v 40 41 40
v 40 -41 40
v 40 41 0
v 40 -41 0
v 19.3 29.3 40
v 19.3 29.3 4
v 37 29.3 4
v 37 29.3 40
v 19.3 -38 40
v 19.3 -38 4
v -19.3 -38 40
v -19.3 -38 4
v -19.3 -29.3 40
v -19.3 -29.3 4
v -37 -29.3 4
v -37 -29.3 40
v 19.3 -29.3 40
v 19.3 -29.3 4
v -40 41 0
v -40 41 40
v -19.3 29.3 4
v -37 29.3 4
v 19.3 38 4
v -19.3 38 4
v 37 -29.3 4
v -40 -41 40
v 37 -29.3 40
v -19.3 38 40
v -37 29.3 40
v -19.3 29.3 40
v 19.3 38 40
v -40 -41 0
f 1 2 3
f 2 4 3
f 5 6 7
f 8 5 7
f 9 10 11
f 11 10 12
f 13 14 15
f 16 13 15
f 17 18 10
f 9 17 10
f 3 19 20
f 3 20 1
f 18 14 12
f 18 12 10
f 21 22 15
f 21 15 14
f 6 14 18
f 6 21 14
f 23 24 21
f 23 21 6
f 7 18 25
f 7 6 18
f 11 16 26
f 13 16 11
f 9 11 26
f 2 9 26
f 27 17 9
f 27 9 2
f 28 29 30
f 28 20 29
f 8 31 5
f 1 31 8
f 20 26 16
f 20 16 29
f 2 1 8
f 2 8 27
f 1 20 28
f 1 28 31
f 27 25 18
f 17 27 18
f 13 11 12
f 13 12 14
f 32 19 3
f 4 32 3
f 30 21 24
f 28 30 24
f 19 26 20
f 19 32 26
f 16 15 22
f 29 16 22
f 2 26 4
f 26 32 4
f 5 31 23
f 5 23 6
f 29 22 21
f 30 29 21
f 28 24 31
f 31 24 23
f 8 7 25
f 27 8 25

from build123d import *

# Parameters (mm, degrees)
F0_W     = 80
F0_H     = 82
F1_DEPTH = 4
F2_W     = 80
F2_H     = 82
F3_DEPTH = 36


with BuildPart() as f1:
    # F0 (on Top) → F1 (new body)
    with BuildSketch(Plane.XY):
        Rectangle(F0_W, F0_H)
    extrude(amount=F1_DEPTH)

    # F2 (on face) → F3 (join)
    with BuildSketch(Plane.XY.offset(4)):
        Rectangle(F2_W, F2_H)
        Polygon((-37, 29.3), (-19.3, 29.3), (-19.3, 38), (19.3, 38), (19.3, 29.3), (37, 29.3), (37, -29.3), (19.3, -29.3), (19.3, -38), (-19.3, -38), (-19.3, -29.3), (-37, -29.3), align=None, mode=Mode.SUBTRACT)
    extrude(amount=F3_DEPTH)


solid = f1.part
